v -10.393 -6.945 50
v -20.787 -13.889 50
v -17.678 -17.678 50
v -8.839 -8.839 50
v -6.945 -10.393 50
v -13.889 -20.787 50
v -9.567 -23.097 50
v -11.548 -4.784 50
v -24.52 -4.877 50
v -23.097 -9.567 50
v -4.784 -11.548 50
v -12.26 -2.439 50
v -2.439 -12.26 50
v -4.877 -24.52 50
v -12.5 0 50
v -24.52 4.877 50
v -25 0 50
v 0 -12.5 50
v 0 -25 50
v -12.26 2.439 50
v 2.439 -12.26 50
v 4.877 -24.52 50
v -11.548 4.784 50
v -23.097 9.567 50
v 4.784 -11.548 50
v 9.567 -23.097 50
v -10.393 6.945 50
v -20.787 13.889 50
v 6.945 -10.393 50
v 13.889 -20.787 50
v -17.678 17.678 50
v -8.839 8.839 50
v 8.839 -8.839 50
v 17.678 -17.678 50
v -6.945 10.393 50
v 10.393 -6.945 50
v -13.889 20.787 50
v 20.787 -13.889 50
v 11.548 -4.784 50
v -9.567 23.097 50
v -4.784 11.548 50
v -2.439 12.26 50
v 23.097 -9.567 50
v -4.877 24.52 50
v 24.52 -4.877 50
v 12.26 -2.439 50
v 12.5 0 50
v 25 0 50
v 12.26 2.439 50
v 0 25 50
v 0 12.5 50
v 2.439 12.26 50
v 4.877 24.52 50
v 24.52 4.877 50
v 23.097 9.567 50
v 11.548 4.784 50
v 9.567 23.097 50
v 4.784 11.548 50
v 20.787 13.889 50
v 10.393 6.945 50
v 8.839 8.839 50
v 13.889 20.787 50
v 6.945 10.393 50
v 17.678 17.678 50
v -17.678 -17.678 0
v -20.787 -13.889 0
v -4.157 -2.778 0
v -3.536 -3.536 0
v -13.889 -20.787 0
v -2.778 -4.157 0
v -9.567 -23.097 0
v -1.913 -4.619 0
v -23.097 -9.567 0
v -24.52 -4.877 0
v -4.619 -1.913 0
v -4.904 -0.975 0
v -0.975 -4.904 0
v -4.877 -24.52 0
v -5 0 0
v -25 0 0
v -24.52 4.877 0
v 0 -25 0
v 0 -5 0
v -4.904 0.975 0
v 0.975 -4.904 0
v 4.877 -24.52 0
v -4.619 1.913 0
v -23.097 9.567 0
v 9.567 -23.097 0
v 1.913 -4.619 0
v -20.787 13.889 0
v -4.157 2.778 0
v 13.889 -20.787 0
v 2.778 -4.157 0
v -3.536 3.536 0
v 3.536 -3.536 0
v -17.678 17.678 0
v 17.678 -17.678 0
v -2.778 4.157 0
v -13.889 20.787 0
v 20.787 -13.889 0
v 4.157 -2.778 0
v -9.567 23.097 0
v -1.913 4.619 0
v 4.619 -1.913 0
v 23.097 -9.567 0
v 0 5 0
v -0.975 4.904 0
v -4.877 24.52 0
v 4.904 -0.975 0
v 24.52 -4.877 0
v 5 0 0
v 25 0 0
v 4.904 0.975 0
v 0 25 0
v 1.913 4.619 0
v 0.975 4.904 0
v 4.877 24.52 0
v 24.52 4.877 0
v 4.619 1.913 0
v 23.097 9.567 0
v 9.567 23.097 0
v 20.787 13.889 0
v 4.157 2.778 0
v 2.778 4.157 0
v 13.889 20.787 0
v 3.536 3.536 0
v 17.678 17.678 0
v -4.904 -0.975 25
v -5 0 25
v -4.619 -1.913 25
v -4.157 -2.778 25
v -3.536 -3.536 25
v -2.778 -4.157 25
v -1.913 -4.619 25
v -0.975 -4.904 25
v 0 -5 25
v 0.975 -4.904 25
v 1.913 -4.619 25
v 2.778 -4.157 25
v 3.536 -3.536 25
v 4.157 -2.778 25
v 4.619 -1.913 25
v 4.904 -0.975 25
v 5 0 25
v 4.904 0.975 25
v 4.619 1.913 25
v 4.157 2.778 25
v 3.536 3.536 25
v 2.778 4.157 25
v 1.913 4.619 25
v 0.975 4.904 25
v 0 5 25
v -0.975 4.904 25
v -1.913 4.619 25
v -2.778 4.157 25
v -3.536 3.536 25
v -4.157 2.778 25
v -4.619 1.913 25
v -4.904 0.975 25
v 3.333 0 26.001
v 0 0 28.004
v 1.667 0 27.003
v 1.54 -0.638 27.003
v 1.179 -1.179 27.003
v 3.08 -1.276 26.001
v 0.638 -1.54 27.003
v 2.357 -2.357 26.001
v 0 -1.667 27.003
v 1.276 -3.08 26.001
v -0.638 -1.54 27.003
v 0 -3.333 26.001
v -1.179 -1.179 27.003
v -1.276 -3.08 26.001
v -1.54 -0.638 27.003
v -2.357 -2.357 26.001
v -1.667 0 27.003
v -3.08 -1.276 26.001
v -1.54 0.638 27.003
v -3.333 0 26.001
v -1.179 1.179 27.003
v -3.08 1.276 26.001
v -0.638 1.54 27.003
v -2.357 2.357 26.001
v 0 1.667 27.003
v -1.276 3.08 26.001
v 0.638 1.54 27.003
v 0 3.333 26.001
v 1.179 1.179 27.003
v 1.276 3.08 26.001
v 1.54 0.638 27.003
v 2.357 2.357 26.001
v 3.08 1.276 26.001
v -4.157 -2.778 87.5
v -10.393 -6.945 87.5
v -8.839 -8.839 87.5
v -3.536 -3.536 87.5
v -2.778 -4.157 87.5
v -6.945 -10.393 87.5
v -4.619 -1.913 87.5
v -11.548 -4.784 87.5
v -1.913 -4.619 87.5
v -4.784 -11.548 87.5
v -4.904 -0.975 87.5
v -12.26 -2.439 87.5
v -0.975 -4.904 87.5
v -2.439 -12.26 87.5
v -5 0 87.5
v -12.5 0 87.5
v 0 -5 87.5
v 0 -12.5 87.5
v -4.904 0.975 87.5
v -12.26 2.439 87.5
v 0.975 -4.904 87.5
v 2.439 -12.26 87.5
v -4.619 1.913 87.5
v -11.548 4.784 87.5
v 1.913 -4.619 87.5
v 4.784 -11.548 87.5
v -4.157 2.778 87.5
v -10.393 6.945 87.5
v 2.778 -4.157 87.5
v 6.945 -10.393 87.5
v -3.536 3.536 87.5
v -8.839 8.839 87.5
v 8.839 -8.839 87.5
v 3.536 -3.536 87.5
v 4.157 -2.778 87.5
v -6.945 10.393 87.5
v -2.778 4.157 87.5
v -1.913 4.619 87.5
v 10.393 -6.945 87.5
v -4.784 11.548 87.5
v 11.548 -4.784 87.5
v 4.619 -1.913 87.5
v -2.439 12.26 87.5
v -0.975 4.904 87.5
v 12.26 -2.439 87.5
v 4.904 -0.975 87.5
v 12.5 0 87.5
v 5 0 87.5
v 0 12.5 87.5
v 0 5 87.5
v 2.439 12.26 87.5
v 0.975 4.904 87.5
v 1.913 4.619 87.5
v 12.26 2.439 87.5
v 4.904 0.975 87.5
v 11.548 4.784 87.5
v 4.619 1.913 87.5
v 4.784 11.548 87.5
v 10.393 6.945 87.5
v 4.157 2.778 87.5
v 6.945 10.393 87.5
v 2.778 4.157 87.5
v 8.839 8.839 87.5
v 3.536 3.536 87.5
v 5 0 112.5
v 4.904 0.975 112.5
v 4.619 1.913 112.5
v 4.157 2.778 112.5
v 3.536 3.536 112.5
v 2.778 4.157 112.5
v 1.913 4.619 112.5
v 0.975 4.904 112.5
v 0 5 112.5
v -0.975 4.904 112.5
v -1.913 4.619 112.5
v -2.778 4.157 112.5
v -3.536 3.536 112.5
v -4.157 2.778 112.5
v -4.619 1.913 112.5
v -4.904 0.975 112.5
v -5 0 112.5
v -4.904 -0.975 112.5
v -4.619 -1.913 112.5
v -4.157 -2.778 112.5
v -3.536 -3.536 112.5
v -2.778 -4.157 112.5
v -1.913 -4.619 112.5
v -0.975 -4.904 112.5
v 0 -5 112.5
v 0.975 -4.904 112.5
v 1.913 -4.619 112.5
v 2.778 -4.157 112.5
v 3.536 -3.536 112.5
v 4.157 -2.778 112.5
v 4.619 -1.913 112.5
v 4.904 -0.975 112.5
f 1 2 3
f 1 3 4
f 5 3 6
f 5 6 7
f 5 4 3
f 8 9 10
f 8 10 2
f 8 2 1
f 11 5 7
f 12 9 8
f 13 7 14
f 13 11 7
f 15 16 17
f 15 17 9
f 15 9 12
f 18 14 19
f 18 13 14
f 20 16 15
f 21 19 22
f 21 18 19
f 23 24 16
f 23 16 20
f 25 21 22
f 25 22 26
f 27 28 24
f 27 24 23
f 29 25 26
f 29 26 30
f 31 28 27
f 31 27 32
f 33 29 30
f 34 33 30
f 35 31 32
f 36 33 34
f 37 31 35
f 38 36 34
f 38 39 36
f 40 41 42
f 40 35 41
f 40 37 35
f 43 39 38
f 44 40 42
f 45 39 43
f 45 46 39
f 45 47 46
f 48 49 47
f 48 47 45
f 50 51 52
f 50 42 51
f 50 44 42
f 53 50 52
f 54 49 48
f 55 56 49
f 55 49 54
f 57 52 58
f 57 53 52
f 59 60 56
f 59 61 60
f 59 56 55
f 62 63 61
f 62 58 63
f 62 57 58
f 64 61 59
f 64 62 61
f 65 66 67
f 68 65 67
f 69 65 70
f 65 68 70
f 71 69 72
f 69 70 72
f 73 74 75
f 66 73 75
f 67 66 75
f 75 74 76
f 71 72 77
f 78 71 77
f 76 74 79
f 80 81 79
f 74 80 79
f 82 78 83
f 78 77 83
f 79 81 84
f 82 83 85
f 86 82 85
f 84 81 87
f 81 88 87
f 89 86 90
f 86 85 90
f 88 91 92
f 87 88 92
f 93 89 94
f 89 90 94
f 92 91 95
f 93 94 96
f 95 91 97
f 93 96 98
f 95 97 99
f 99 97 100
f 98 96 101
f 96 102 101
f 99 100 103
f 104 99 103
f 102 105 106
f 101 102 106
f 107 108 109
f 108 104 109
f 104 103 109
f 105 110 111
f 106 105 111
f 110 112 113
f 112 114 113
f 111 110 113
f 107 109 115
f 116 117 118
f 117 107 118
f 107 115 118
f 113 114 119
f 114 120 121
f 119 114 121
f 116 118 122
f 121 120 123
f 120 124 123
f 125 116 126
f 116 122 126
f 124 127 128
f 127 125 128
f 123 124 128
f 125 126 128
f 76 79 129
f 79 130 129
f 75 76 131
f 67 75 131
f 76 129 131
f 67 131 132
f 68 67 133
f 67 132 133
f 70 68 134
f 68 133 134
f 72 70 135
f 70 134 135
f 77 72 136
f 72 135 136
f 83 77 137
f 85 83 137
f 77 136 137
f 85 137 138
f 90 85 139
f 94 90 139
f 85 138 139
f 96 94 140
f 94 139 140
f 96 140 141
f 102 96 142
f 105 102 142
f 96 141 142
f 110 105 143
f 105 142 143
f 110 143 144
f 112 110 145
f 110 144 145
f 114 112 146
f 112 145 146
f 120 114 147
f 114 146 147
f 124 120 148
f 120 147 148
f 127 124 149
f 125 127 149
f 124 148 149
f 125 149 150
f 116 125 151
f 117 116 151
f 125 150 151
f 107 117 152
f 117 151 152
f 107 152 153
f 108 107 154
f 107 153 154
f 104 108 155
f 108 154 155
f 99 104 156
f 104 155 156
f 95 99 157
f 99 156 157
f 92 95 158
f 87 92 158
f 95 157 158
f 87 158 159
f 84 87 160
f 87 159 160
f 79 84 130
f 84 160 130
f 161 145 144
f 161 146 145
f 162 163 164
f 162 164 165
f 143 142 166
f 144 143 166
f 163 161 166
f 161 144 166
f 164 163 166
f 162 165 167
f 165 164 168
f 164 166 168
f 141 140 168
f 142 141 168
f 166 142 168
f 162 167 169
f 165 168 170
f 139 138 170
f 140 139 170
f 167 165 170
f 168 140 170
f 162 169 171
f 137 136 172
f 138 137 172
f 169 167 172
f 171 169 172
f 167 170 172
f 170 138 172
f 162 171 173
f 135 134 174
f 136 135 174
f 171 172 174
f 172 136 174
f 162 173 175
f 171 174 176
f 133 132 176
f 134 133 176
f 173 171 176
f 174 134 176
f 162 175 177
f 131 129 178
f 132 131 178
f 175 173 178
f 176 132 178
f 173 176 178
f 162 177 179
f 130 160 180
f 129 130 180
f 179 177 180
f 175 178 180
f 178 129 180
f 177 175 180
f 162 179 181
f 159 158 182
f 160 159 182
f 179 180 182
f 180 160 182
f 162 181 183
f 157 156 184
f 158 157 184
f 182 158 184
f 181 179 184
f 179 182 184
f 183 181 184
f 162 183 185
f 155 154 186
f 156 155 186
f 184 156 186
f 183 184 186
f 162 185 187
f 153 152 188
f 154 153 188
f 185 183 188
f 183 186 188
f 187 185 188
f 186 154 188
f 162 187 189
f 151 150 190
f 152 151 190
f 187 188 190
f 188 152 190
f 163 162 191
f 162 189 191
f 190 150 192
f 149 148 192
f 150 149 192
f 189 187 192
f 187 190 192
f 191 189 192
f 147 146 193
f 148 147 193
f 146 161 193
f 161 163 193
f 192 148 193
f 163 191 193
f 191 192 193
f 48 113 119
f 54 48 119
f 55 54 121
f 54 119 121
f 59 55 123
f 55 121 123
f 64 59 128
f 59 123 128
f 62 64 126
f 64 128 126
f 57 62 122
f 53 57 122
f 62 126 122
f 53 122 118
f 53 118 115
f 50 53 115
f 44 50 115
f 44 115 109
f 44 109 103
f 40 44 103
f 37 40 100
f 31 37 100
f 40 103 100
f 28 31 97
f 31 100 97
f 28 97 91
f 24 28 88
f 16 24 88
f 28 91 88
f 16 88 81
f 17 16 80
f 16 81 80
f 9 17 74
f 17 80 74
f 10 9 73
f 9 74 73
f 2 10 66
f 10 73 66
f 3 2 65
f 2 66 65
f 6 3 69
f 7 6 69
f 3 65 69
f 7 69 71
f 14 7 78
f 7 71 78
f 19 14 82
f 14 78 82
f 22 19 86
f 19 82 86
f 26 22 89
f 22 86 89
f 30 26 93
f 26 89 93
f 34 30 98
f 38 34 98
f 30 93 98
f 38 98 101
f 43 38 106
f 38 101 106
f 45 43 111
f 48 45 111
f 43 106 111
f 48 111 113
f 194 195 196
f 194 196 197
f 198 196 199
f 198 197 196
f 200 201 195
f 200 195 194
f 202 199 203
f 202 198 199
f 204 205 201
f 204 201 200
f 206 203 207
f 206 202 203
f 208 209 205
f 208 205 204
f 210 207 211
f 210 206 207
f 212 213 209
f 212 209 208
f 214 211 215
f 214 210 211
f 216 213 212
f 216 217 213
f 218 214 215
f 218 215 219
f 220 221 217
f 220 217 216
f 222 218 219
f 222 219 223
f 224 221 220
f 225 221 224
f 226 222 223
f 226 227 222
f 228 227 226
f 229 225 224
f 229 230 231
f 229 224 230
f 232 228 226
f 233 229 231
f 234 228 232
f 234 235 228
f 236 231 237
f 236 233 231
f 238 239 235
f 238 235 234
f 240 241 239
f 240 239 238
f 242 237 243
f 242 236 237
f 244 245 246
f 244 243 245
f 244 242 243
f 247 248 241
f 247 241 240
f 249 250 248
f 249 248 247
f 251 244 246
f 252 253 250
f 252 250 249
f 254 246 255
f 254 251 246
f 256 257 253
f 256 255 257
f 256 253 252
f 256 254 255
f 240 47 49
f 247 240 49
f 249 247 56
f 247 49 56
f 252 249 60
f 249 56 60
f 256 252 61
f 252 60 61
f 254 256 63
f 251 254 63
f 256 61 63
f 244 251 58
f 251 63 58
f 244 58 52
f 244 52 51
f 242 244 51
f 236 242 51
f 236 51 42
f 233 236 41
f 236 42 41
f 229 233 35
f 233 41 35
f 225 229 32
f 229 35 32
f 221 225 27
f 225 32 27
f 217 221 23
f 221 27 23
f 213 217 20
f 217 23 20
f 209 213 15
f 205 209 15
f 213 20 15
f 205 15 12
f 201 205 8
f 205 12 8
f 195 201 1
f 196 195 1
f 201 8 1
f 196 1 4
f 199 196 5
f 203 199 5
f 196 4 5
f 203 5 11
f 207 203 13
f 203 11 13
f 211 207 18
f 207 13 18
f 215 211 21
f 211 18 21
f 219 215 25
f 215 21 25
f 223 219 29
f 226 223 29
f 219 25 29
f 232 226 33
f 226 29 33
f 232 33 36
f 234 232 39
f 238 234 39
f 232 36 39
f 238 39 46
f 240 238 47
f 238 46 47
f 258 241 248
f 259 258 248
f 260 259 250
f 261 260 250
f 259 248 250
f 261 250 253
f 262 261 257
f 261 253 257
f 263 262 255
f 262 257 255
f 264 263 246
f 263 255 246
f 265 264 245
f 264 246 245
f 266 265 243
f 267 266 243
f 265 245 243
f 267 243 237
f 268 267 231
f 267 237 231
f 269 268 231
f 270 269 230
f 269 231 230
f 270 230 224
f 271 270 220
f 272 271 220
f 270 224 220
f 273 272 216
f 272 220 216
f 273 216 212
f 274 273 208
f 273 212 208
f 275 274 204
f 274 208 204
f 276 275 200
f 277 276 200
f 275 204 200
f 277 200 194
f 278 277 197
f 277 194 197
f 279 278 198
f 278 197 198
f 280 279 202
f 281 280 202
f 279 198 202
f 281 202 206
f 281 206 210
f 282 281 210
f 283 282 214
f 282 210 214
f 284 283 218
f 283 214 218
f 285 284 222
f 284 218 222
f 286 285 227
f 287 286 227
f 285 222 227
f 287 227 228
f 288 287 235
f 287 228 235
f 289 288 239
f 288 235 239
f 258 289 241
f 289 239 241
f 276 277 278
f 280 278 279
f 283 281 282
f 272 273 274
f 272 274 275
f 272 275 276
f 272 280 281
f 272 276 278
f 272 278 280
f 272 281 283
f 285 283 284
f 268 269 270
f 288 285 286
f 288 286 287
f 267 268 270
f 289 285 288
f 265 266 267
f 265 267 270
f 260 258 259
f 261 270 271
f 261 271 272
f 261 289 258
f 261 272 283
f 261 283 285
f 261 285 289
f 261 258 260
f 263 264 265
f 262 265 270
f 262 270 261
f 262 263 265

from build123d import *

# Parameters (mm, degrees)
F0_R      = 25
F2_DEPTH  = 50
F3_R      = 12.5
F4_DEPTH  = 37.5
F10_D     = 10
F10_DEPTH = 25
F10_TIP   = 3.0043030951
F11_R     = 5
F12_DEPTH = 25


# Not quite as in the source:
# - a feature of the source that left no trace in its solid (it failed there, or was rolled back) is left out


with BuildPart() as f2:
    # F0 (on Top) → F2 (new body)
    with BuildSketch(Plane.XY):
        Circle(F0_R)
    extrude(amount=F2_DEPTH)

    # F3 (on face) → F4 (join)
    with BuildSketch(Plane.XY.offset(50)):
        Circle(F3_R)
    extrude(amount=F4_DEPTH)

    # F10
    with Locations(Plane(origin=(0, 0, 0), x_dir=(1, 0, 0), z_dir=(0, 0, -1))):
        with Locations((0, 0)):
            Hole(F10_D / 2, depth=F10_DEPTH)
            with Locations((0, 0, -(F10_DEPTH + F10_TIP / 2))):  # 118° drill point
                Cone(0, F10_D / 2, F10_TIP, mode=Mode.SUBTRACT)

    # F11 (on face) → F12 (join)
    with BuildSketch(Plane.XY.offset(87.5)):
        Circle(F11_R)
    extrude(amount=F12_DEPTH)


solid = f2.part
